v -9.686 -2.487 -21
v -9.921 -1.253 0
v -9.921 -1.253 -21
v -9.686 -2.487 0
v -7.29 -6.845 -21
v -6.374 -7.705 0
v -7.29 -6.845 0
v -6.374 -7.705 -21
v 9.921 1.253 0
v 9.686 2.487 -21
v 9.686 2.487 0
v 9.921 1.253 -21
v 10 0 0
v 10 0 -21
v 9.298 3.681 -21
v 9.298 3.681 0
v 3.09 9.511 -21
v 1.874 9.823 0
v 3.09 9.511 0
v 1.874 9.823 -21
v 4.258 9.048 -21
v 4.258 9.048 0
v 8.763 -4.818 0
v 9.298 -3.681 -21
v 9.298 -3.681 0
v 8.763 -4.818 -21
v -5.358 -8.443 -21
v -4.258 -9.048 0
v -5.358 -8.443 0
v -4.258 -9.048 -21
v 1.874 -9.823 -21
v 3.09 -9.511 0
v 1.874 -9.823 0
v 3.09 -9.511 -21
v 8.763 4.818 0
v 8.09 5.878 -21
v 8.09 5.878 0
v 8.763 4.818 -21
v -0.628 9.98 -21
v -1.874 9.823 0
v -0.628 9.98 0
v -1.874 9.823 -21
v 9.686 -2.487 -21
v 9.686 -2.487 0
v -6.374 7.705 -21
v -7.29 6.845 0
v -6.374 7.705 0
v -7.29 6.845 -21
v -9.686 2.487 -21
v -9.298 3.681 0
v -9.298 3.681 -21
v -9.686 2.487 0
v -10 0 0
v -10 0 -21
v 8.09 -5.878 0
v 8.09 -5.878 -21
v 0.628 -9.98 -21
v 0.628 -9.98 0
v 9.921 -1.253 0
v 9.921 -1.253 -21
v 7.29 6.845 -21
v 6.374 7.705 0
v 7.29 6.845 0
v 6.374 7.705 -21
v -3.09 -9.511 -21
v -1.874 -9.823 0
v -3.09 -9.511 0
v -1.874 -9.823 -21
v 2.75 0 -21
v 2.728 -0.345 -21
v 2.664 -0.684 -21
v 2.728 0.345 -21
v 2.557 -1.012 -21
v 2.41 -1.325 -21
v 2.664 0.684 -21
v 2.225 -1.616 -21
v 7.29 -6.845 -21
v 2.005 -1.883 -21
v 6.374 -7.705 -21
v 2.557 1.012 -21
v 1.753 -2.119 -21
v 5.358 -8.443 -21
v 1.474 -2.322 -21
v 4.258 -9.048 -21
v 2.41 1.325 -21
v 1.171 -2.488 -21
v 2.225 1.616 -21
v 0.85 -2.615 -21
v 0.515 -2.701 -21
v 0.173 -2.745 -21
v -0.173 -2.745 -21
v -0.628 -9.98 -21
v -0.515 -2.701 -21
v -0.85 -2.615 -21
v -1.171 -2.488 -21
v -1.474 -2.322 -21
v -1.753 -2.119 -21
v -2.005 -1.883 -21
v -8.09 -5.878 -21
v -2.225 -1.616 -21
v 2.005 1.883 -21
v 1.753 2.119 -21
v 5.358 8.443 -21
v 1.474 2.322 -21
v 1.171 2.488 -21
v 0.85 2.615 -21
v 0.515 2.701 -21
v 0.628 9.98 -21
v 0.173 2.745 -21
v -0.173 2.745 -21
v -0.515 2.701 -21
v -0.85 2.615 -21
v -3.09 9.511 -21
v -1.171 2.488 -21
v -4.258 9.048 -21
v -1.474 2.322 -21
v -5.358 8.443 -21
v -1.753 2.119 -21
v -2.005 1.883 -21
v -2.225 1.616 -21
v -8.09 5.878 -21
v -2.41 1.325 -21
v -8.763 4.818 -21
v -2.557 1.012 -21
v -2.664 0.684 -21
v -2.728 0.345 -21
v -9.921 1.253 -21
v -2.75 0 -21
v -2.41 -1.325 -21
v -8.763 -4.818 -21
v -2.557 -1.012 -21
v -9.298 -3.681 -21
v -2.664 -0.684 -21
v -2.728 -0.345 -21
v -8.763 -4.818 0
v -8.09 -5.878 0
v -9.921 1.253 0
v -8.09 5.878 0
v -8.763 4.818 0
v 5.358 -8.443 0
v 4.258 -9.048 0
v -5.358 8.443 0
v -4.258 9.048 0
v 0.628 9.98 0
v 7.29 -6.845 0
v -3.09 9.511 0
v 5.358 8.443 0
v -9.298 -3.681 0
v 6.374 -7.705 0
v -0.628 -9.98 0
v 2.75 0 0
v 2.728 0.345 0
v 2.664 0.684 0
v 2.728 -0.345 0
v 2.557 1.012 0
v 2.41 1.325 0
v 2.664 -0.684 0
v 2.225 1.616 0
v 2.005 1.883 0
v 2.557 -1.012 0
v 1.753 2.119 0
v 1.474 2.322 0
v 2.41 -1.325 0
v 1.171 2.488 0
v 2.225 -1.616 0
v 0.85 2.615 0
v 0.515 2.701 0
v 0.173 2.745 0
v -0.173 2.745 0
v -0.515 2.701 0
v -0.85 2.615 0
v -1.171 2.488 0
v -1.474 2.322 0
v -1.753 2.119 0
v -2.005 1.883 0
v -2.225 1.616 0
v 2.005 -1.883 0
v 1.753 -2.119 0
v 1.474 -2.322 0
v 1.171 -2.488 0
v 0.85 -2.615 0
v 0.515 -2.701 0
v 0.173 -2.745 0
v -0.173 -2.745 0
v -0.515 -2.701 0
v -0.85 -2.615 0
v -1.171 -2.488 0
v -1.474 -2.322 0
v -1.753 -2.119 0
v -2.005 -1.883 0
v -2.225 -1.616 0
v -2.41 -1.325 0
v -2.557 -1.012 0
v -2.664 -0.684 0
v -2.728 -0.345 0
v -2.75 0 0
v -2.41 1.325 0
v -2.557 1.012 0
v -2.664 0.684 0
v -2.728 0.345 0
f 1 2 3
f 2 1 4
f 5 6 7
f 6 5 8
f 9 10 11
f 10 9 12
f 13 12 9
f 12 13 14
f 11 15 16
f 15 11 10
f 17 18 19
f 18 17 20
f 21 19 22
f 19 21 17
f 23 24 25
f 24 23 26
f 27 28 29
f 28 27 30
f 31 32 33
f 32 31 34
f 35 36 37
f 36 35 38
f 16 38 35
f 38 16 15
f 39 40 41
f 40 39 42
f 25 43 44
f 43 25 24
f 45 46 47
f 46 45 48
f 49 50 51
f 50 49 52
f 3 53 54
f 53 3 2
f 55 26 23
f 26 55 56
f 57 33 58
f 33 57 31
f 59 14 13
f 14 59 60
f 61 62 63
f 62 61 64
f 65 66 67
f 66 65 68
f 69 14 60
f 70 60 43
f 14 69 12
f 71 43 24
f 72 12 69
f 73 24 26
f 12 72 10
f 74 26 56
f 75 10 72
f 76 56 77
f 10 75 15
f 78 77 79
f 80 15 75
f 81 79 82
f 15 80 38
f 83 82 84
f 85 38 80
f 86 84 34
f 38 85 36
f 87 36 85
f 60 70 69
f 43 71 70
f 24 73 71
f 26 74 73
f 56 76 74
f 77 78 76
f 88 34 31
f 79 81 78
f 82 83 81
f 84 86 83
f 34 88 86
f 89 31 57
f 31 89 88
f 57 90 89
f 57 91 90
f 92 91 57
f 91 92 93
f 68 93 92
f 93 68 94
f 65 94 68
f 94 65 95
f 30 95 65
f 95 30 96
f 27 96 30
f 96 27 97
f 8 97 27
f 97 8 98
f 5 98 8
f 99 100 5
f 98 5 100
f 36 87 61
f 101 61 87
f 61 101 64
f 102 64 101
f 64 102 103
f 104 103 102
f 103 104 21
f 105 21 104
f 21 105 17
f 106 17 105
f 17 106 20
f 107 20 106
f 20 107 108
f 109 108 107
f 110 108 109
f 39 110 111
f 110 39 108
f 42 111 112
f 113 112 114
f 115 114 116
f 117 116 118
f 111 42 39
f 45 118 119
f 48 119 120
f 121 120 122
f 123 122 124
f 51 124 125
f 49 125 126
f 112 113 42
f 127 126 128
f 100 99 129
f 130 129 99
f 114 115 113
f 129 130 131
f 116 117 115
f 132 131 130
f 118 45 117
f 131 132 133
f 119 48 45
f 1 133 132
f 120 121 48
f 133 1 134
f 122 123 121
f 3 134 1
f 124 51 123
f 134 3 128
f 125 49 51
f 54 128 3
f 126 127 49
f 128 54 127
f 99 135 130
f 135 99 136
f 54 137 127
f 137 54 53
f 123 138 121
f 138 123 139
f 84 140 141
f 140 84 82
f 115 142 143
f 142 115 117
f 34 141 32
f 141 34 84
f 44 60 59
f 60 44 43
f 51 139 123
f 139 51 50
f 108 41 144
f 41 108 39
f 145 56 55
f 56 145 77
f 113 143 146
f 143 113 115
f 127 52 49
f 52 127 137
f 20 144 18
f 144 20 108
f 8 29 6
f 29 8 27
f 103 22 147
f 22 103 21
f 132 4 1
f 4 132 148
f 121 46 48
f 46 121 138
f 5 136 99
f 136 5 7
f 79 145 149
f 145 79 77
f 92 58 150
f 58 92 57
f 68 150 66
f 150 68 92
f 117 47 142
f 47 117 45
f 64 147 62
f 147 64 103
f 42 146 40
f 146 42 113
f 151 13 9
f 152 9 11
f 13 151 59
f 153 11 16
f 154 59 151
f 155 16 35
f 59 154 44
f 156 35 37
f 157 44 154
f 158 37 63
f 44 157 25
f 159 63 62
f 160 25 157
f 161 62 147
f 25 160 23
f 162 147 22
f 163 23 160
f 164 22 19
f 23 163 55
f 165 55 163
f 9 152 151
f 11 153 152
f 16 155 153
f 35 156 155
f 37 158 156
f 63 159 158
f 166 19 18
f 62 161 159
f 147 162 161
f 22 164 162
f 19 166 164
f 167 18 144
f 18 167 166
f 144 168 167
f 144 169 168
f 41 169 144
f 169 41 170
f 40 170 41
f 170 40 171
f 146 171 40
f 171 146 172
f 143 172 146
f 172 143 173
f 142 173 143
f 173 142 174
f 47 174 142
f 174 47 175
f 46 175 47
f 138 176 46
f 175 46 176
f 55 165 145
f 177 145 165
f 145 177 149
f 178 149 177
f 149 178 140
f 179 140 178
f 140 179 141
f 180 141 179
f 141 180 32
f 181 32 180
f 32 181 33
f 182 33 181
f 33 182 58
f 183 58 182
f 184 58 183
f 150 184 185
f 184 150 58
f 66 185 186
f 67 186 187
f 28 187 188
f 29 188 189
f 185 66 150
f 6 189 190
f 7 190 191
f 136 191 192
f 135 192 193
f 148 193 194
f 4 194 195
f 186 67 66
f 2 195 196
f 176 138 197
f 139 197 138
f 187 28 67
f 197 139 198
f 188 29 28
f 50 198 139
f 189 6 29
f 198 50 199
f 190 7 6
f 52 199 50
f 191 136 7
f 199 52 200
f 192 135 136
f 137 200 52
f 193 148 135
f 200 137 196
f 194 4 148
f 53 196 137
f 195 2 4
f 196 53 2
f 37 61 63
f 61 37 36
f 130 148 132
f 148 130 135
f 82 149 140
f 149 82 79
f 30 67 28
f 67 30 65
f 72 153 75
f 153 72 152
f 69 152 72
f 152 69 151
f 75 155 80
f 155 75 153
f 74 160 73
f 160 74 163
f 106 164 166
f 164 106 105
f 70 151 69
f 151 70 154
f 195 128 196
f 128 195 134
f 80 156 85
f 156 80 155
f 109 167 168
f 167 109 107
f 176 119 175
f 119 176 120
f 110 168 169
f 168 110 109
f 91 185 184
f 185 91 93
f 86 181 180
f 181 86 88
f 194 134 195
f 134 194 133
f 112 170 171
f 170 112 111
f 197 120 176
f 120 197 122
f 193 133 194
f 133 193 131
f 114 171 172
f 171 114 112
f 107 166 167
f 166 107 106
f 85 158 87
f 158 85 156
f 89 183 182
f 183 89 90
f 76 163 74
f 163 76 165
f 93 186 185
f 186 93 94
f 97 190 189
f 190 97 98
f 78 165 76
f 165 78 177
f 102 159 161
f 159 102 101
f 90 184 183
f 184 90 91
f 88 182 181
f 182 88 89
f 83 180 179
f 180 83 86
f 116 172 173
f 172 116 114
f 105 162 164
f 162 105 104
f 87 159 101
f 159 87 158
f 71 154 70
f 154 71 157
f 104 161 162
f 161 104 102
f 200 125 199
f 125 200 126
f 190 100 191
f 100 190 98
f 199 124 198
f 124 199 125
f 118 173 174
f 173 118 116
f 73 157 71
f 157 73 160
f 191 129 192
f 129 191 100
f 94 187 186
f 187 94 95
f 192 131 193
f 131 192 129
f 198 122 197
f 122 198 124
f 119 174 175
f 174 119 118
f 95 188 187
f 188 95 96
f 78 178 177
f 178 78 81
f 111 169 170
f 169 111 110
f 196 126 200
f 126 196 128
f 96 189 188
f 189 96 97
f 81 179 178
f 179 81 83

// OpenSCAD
$fn = 50;


difference() {
	union() {
		translate(v = [0, 0, -21.0000000000]) {
			cylinder(h = 21, r = 10.0000000000);
		}
		cylinder(h = 0, r = 19.0000000000);
	}
	union() {
		#translate(v = [0, 0, -21]) {
			cylinder(h = 21, r = 2.7500000000);
		}
	}
}
